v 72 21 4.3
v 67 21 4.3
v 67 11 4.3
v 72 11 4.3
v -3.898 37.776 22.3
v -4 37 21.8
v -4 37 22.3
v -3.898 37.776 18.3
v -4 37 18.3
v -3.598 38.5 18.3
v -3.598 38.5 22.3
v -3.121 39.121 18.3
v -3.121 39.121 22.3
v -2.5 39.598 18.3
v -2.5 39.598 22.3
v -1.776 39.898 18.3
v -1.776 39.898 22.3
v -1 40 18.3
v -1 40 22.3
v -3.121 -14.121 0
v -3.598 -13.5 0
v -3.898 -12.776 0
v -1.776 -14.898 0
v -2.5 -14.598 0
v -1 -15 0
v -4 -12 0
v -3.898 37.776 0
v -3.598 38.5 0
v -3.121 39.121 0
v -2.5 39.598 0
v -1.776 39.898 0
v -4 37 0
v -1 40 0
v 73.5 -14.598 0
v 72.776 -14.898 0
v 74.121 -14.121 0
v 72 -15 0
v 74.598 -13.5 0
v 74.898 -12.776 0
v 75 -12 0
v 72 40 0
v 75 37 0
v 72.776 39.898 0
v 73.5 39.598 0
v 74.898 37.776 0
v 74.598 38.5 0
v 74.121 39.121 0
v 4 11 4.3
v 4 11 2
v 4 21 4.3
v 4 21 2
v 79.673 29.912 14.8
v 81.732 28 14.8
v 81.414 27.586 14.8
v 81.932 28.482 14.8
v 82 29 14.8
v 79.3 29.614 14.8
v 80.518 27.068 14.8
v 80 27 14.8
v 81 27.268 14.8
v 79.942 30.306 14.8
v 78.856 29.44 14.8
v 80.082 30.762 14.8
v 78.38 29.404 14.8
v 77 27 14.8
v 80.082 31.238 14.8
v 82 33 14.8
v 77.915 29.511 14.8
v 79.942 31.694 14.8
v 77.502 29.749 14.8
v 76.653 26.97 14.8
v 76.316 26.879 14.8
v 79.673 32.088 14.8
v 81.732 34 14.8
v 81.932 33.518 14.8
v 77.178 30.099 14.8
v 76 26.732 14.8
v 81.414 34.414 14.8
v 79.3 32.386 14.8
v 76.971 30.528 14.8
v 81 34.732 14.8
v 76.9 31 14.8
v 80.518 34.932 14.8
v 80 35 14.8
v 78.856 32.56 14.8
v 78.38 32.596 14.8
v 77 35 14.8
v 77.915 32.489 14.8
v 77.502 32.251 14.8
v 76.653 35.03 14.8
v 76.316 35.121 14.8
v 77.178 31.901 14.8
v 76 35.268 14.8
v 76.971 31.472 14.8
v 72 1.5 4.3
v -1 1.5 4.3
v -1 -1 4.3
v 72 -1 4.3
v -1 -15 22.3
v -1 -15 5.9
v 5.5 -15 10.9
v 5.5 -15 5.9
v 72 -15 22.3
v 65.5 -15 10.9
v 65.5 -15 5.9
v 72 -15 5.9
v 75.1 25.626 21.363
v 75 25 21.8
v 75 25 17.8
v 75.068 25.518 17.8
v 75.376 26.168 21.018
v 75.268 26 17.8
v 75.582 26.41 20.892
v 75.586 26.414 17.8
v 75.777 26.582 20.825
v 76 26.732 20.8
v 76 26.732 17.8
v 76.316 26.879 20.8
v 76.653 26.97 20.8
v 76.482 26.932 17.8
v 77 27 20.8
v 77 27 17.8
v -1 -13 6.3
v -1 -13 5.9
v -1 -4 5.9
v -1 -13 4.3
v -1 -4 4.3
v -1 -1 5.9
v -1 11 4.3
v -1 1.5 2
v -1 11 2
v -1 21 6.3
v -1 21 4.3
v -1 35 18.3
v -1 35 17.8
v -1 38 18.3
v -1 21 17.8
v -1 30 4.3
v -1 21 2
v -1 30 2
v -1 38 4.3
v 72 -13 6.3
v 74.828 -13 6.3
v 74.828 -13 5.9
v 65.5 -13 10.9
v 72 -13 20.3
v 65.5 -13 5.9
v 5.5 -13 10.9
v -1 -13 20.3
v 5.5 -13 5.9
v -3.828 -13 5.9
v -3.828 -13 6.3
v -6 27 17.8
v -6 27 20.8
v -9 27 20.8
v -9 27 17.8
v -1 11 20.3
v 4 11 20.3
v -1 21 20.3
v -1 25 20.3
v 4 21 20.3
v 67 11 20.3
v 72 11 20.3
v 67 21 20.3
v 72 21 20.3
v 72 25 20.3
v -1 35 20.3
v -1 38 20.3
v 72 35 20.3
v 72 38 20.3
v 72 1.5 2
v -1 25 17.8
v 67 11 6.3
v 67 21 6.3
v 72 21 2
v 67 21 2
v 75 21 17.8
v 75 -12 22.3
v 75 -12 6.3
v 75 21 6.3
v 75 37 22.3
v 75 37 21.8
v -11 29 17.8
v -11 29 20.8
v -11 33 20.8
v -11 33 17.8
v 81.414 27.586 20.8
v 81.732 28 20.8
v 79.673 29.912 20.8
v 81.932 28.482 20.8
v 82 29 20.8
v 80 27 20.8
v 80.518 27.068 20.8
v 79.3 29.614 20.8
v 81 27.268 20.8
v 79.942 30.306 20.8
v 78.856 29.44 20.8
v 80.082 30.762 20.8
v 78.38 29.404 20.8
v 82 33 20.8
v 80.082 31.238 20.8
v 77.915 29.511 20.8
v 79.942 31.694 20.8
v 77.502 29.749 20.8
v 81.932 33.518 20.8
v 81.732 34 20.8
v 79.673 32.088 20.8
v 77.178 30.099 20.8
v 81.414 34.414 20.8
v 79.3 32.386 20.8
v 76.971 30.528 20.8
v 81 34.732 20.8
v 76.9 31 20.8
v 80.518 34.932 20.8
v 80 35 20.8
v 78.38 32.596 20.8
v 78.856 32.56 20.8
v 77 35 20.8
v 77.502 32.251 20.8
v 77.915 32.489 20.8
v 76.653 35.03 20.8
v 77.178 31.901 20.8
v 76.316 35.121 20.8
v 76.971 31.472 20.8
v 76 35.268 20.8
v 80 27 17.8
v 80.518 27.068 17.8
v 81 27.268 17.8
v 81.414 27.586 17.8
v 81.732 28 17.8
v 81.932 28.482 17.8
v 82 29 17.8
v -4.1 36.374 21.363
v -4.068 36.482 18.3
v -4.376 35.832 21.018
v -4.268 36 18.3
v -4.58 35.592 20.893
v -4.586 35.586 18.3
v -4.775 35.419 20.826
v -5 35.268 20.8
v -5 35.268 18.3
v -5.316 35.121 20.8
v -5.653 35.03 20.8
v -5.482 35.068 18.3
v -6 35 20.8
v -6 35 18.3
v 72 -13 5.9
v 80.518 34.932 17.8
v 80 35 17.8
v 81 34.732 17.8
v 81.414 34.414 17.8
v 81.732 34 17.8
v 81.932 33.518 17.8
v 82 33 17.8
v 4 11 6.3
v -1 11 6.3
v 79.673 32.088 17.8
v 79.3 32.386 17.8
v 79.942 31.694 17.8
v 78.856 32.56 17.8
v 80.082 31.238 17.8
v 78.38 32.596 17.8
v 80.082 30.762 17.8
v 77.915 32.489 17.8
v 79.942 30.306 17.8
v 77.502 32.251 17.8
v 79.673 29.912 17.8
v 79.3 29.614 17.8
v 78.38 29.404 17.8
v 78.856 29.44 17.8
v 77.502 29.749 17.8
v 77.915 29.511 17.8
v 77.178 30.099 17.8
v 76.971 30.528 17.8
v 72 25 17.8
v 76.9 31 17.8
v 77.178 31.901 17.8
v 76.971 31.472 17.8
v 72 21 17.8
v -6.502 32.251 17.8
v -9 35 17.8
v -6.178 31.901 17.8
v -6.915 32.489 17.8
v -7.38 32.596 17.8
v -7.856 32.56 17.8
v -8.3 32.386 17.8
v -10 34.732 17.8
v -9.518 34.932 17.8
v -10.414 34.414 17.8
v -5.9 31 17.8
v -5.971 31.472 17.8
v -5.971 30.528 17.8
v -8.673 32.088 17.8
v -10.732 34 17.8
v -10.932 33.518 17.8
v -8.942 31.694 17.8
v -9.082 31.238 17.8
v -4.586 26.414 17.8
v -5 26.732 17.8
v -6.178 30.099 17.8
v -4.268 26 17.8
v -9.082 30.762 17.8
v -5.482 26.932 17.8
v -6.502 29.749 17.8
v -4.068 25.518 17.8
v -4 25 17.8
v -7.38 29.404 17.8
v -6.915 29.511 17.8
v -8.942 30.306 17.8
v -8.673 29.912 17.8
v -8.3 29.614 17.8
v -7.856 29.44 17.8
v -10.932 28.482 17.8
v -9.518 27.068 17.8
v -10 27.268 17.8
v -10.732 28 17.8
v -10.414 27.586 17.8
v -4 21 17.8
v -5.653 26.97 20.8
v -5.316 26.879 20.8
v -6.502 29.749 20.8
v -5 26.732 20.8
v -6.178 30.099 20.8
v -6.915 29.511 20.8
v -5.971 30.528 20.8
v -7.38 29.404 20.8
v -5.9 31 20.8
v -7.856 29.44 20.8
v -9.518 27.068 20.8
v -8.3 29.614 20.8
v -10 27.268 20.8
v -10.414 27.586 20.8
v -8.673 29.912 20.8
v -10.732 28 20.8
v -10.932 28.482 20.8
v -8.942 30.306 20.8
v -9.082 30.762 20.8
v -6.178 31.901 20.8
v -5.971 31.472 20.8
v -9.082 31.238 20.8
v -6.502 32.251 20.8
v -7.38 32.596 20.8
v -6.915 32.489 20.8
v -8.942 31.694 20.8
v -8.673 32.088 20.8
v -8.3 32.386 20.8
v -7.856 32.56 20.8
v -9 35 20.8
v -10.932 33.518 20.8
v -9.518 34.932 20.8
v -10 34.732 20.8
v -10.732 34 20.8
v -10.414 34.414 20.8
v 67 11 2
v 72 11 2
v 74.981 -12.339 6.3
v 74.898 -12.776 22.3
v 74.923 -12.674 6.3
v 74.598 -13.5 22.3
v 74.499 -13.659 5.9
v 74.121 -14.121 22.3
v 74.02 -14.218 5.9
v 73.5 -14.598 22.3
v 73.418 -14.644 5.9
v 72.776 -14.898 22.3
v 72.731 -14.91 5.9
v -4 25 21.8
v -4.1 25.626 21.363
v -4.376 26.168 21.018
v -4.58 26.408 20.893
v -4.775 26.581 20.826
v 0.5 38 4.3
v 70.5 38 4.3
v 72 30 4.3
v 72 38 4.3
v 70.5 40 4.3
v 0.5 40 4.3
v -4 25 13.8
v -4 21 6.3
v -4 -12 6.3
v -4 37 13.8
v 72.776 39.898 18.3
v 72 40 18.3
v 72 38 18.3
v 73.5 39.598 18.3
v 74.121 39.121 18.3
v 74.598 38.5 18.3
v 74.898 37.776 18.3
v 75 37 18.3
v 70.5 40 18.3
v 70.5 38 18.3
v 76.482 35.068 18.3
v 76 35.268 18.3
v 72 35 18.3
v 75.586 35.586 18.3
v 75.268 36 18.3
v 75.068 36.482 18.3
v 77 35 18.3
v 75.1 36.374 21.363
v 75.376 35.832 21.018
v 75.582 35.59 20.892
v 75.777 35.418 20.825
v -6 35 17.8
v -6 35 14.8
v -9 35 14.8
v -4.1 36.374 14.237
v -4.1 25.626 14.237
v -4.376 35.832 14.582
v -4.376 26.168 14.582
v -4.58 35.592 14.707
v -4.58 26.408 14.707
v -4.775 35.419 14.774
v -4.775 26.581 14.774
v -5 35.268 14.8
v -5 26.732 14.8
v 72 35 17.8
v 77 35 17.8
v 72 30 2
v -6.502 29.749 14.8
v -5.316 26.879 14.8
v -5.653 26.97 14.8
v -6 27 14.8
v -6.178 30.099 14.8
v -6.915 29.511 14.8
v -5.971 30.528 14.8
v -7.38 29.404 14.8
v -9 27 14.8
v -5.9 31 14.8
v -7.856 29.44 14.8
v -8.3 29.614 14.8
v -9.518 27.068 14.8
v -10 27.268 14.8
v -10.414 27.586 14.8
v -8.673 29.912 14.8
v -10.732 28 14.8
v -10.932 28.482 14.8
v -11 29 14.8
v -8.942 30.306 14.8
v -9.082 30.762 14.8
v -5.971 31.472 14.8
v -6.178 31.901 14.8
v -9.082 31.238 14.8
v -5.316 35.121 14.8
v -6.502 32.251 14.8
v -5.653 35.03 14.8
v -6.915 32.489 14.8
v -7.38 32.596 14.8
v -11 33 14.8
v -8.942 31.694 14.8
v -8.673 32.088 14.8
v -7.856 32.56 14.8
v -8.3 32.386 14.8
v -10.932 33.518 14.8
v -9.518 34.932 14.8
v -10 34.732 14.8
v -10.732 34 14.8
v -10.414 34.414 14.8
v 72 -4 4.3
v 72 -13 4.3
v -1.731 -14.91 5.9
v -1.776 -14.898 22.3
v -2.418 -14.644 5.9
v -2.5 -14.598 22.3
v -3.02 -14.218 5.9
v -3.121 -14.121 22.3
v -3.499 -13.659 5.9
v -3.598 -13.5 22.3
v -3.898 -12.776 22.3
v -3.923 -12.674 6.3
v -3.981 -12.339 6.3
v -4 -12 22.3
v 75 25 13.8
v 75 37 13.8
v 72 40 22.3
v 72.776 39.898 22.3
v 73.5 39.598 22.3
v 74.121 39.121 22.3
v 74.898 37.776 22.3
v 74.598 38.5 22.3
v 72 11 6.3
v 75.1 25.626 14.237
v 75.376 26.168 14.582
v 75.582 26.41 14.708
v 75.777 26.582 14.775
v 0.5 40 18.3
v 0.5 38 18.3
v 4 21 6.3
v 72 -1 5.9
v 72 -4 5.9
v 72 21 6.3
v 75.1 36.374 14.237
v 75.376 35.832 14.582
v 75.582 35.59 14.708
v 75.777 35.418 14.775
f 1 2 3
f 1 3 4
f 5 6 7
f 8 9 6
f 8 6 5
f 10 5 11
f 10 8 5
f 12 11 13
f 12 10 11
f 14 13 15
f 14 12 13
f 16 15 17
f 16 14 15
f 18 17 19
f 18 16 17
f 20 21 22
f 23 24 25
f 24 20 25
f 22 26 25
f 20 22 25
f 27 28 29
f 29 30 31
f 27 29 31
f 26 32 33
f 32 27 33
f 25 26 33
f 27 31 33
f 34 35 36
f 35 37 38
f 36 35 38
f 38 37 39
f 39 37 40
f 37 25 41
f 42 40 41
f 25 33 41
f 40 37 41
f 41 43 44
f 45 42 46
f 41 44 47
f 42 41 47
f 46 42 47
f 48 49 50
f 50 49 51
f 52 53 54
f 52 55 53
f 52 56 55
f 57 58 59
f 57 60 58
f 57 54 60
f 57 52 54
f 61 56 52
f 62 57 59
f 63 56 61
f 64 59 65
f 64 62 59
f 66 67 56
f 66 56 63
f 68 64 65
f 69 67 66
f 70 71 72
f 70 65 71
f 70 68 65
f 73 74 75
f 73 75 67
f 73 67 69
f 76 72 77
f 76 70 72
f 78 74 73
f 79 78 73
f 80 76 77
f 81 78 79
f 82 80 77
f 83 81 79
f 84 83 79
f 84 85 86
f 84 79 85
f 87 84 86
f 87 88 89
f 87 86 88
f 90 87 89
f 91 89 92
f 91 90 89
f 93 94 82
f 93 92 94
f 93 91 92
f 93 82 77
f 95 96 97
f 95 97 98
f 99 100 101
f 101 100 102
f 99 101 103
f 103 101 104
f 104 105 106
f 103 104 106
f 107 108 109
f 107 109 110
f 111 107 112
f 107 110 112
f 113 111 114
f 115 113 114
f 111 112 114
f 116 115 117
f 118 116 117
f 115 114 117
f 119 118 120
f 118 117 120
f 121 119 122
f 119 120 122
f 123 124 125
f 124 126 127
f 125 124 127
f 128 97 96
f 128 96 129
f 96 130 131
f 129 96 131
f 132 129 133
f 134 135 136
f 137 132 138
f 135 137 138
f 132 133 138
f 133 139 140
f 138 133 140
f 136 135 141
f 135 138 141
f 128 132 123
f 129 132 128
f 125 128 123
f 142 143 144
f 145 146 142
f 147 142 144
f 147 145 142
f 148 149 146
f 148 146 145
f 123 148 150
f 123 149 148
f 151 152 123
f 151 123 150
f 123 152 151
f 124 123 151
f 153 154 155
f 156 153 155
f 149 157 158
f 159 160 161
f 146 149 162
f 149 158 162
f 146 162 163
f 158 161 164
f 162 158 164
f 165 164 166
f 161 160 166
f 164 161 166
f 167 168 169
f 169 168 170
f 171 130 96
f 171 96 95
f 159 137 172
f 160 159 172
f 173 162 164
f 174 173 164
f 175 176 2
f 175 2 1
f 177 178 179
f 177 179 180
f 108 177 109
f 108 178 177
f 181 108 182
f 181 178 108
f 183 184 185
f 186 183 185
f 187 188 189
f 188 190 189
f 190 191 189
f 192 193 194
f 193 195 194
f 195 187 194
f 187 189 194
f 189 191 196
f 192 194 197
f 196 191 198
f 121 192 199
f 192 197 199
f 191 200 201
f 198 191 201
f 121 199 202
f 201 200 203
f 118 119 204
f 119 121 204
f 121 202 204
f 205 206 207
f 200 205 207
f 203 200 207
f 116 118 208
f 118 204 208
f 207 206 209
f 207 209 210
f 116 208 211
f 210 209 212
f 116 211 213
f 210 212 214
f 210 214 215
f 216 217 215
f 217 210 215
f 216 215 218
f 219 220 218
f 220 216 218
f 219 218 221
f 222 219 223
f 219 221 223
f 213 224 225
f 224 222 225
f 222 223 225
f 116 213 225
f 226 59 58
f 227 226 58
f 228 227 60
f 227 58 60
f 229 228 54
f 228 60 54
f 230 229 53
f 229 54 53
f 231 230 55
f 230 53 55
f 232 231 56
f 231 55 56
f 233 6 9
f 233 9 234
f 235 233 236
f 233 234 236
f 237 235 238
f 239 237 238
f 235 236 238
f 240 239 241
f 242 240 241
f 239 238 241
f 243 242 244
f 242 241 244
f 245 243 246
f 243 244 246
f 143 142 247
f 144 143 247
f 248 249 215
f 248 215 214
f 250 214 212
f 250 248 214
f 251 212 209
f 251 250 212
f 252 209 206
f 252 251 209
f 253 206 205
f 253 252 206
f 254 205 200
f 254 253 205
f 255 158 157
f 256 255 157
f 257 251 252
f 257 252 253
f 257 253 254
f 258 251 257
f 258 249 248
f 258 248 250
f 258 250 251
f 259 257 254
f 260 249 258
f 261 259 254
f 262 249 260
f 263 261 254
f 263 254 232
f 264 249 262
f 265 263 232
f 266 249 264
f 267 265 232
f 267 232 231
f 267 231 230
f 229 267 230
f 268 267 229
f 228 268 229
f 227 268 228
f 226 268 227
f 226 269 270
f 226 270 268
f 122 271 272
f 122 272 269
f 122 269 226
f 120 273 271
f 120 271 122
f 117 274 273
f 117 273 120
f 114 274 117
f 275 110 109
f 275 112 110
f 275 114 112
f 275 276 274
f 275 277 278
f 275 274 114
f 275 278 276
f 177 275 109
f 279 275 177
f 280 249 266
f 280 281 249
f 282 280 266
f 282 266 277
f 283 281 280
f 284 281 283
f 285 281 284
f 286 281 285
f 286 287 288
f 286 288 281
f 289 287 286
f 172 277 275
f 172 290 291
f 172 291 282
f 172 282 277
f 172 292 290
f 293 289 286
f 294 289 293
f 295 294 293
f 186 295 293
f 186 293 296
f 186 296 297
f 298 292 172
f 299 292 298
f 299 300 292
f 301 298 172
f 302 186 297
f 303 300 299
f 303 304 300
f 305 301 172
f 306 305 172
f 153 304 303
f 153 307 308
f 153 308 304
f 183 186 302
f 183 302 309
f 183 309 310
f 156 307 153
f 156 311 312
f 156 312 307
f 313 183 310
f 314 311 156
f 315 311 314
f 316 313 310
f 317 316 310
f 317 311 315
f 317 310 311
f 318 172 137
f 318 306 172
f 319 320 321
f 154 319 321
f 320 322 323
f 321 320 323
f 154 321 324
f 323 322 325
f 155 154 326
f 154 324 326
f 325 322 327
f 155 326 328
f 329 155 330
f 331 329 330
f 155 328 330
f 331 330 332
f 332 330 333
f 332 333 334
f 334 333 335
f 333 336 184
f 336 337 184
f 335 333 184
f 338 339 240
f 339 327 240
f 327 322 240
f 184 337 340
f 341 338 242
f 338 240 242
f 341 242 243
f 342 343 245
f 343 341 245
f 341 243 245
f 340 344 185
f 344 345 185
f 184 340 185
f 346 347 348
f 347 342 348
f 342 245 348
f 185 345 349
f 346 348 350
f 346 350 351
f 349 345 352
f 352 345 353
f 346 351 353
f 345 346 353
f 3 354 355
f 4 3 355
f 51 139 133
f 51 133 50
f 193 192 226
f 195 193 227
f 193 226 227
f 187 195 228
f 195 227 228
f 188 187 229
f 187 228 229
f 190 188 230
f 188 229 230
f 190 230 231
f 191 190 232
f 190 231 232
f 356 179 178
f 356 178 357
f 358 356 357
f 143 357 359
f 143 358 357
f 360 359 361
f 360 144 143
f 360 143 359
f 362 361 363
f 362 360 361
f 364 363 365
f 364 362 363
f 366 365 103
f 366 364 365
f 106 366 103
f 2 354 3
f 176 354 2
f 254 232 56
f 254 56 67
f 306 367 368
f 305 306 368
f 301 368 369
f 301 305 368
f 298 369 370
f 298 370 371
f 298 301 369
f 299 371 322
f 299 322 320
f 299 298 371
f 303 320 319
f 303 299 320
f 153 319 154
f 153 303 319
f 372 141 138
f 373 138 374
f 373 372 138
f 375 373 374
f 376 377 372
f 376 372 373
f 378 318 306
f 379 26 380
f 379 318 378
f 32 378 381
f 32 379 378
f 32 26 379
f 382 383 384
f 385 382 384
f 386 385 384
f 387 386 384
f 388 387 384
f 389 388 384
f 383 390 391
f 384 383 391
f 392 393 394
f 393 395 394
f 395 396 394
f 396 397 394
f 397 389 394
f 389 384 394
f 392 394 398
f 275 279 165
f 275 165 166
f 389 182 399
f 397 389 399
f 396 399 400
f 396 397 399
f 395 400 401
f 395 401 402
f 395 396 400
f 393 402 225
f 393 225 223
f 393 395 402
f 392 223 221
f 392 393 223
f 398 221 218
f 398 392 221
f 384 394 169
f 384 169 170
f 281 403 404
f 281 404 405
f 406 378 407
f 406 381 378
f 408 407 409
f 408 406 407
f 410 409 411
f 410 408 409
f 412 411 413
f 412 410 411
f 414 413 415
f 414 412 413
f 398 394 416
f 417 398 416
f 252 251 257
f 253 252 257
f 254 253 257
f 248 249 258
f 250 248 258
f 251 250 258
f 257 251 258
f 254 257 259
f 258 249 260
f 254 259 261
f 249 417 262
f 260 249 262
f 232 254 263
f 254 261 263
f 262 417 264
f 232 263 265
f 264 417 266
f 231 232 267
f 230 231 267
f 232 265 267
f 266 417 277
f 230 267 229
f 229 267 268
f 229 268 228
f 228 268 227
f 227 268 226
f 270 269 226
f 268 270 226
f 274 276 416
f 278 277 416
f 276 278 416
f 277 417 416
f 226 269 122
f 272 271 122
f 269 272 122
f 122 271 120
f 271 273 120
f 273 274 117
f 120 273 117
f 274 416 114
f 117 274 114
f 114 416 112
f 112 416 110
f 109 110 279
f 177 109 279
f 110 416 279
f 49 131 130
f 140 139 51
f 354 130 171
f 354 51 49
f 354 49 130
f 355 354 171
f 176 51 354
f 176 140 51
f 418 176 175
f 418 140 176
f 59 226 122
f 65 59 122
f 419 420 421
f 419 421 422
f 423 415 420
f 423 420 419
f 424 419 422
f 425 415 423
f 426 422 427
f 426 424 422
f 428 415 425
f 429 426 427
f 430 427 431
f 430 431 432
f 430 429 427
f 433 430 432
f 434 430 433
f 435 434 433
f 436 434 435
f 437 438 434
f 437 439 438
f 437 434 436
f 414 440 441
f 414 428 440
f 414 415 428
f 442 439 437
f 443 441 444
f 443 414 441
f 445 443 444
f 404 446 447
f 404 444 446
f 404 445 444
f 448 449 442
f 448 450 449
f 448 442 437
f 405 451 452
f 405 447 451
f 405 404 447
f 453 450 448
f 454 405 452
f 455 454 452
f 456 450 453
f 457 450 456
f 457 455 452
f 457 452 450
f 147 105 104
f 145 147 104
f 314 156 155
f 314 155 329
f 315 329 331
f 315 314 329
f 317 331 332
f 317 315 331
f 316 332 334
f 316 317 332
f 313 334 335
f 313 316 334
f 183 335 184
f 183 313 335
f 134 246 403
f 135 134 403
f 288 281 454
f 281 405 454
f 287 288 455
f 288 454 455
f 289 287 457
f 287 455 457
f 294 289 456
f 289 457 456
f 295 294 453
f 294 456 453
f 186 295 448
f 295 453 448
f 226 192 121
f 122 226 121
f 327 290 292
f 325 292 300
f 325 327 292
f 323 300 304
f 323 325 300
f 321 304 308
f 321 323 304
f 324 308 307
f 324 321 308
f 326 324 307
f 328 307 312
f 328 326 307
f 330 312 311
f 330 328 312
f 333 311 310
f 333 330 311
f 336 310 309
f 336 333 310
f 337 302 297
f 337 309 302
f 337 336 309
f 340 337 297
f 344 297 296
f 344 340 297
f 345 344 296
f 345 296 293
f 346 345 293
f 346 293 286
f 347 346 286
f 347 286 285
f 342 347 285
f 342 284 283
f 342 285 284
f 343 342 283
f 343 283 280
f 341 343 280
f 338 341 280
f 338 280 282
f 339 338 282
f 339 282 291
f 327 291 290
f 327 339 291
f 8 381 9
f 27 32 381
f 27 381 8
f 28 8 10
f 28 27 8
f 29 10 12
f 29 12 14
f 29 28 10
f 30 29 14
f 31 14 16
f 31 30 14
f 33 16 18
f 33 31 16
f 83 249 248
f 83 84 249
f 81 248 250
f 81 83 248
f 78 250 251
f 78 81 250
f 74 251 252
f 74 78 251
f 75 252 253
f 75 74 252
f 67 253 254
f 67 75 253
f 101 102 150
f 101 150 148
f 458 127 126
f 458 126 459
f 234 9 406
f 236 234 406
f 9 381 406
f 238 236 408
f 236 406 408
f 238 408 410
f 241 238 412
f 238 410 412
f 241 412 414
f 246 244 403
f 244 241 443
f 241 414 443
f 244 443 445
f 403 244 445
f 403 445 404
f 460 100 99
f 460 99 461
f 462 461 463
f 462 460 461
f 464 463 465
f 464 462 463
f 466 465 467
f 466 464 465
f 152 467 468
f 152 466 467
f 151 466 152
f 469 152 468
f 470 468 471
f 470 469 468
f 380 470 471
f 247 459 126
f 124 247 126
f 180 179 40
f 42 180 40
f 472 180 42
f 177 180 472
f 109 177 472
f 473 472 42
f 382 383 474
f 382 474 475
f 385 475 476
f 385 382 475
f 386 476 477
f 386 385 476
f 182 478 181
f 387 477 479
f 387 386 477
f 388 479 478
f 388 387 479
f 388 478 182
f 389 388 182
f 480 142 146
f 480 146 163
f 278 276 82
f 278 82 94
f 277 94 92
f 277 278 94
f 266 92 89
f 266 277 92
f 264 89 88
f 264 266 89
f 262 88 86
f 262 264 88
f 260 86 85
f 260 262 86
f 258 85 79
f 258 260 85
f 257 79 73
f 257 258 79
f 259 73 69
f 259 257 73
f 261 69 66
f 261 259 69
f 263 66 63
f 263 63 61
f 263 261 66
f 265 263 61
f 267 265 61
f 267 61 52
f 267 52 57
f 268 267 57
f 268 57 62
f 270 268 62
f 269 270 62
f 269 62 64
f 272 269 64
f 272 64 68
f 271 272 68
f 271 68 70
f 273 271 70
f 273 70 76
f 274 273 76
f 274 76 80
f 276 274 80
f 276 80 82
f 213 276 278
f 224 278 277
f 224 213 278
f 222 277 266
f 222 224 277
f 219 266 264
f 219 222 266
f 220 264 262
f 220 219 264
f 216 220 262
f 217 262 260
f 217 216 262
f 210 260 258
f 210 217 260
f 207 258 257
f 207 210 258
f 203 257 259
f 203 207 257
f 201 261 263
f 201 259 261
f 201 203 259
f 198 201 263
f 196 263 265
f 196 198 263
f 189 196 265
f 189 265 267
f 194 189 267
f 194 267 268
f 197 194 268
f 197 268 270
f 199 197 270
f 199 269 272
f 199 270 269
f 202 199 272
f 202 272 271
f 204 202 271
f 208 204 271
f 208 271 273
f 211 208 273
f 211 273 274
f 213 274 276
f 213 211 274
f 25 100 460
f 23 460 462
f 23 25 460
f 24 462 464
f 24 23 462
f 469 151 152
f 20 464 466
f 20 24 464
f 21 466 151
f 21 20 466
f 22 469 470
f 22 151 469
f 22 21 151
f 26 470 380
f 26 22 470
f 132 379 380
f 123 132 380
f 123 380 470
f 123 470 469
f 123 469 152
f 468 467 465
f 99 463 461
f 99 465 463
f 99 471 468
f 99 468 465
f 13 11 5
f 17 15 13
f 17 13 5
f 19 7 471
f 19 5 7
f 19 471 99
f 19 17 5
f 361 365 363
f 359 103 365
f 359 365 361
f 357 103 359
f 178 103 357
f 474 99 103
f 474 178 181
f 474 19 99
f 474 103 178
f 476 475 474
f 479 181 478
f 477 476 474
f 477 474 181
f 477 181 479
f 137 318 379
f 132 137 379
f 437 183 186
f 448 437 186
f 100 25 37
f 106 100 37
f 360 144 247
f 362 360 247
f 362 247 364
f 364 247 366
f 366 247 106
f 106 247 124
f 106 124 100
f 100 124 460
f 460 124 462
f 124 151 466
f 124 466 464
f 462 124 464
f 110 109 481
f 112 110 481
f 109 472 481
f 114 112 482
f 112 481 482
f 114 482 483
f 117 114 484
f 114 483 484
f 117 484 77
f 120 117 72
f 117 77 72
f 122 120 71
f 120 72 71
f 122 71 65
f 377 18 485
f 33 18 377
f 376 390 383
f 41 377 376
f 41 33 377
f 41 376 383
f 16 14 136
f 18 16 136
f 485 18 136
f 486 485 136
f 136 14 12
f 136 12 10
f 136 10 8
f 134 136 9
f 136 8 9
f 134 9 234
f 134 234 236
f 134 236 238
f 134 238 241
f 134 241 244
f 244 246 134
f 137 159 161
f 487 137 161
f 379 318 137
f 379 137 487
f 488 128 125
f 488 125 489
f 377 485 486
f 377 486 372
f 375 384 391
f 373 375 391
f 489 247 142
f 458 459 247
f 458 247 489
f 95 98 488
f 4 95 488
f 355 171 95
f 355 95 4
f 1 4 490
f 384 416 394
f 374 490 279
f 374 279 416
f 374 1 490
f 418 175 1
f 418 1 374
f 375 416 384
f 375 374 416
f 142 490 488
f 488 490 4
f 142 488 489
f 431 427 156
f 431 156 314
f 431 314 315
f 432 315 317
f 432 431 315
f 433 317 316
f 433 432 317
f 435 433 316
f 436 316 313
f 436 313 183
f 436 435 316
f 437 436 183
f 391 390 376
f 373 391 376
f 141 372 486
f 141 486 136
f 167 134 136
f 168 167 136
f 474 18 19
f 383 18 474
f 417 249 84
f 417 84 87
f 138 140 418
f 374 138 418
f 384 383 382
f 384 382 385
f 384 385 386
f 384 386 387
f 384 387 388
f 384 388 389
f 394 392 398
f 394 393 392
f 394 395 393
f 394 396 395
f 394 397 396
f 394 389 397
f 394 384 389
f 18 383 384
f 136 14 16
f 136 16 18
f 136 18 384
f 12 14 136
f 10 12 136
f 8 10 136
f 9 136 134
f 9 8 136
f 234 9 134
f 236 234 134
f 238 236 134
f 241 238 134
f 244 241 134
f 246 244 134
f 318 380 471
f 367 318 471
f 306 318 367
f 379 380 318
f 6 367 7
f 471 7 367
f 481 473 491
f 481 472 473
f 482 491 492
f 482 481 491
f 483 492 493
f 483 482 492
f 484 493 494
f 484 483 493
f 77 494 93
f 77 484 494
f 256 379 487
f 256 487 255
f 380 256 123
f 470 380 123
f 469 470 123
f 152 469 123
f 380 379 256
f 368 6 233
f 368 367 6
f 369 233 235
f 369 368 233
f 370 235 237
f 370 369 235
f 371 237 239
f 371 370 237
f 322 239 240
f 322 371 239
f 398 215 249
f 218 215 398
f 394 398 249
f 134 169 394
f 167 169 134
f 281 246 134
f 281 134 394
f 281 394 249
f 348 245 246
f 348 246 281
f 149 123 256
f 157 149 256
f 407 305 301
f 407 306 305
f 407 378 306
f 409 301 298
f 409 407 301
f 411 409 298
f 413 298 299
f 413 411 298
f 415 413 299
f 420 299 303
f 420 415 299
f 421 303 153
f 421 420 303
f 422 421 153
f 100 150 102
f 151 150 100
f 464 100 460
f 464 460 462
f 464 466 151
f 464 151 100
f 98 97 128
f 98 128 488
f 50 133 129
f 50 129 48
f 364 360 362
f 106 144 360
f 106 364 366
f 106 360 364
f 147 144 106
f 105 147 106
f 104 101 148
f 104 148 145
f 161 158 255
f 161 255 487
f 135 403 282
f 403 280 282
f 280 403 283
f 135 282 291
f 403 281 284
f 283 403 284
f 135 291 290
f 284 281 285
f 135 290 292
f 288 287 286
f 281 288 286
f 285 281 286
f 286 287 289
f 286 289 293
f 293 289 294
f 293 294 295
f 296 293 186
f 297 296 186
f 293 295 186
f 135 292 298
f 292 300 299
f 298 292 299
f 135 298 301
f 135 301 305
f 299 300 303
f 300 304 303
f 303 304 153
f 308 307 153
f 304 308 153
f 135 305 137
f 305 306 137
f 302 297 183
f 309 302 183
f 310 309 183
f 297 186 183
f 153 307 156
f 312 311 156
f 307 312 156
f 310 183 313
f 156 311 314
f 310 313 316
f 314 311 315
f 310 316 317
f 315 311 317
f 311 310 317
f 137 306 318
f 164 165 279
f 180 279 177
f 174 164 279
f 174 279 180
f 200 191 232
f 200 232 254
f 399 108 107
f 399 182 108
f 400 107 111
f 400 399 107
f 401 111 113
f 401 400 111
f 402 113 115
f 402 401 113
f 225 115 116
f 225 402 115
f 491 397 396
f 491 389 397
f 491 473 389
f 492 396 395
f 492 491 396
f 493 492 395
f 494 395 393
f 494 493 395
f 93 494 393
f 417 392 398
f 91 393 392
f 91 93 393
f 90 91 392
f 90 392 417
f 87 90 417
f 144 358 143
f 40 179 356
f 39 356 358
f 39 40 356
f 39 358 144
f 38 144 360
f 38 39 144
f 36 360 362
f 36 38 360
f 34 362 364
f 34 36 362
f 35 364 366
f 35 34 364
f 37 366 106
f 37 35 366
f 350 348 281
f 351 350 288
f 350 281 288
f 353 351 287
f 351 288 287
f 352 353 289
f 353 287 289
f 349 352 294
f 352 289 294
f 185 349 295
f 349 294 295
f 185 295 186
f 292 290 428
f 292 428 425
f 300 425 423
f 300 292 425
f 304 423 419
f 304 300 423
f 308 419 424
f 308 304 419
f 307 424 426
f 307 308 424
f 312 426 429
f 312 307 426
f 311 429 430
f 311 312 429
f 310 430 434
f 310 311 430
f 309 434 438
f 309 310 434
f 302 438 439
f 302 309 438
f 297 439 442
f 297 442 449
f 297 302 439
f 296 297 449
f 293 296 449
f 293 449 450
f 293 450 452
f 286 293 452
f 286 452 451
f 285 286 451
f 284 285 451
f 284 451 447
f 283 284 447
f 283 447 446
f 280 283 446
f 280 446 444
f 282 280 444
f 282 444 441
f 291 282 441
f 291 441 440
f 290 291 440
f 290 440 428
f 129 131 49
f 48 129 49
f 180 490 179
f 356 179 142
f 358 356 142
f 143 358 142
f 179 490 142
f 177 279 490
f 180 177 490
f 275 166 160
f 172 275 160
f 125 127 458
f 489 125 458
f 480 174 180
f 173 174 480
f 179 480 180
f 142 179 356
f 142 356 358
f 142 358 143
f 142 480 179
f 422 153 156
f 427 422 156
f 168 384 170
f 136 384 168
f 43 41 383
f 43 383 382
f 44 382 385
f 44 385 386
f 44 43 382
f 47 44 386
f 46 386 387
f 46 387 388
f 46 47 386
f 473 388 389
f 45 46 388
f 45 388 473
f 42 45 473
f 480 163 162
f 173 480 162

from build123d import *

# Parameters (mm, degrees)
SKETCH1_W                = 79
SKETCH1_H                = 55
BOSS_EXTRUDE1_DEPTH      = 2
SKETCH2_W                = 79
SKETCH2_H                = 10
SKETCH2_W_2              = 8
SKETCH2_H_2              = 16.5
BOSS_EXTRUDE2_DEPTH      = 2.3
SKETCH3_W                = 79
SKETCH3_H                = 55
SKETCH3_W_2              = 73
SKETCH3_H_2              = 51
BOSS_EXTRUDE3_DEPTH      = 20.3
SKETCH12_W               = 73
SKETCH12_H               = 3
BOSS_EXTRUDE8_DEPTH      = 1.6
SKETCH4_W                = 70
SKETCH4_H                = 14
CUT_EXTRUDE1_DEPTH       = 16
SKETCH5_W                = 60
SKETCH5_H                = 5
CUT_EXTRUDE2_DEPTH       = 16
SKETCH6_W                = 79
SKETCH6_H                = 55
BOSS_EXTRUDE4_DEPTH      = 2
SKETCH7_W                = 73
SKETCH7_H                = 10
BOSS_EXTRUDE5_DEPTH      = 2.5
SKETCH8_W                = 8
SKETCH8_H                = 10
BOSS_EXTRUDE6_DEPTH      = 14
BOSS_EXTRUDE7_DEPTH      = 3
BOSS_EXTRUDE7_DEPTH_BACK = 3
SKETCH10_W               = 7
SKETCH10_H               = 8
SKETCH10_R               = 1.6
FILLET1_R                = 2
FILLET2_R                = 1
FILLET3_START            = -1
FILLET3_DEPTH            = 24
SURFACE_EXTRUDE1_1_BACK  = 90
SURFACE_EXTRUDE1_1_DEPTH = 100
SURFACE_EXTRUDE1_2_BACK  = 90
SURFACE_EXTRUDE1_2_DEPTH = 100


with BuildPart() as part:
    # Sketch1 → Boss-Extrude1 (new body)
    with BuildSketch(Plane.XY):
        with Locations((35.5, 12.5)):
            Rectangle(SKETCH1_W, SKETCH1_H)
    extrude(amount=BOSS_EXTRUDE1_DEPTH)

    # Sketch2 → Boss-Extrude2 (add)
    with BuildSketch(Plane.XY.offset(2)):
        with Locations((35.5, 35)):
            Rectangle(SKETCH2_W, SKETCH2_H)
        with Locations((0, 16)):
            Rectangle(SKETCH2_W_2, SKETCH2_H)
        with Locations((71, 16)):
            Rectangle(SKETCH2_W_2, SKETCH2_H)
        with Locations((35.5, -6.75)):
            Rectangle(SKETCH2_W, SKETCH2_H_2)
    extrude(amount=BOSS_EXTRUDE2_DEPTH)

    # Sketch3 → Boss-Extrude3 (add)
    with BuildSketch(Plane(origin=(0, 0, 0), x_dir=(-1, 0, 0), z_dir=(0, 0, -1))):
        with Locations((-35.5, 12.5)):
            Rectangle(SKETCH3_W, SKETCH3_H)
        with Locations((-35.5, 12.5)):
            Rectangle(SKETCH3_W_2, SKETCH3_H_2, mode=Mode.SUBTRACT)
    extrude(amount=-BOSS_EXTRUDE3_DEPTH)

    # Sketch12 → Boss-Extrude8 (add)
    with BuildSketch(Plane.XY.offset(4.3)):
        with Locations((35.5, -2.5)):
            Rectangle(SKETCH12_W, SKETCH12_H)
    extrude(amount=BOSS_EXTRUDE8_DEPTH)

    # Sketch4 → Cut-Extrude1 (cut)
    with BuildSketch(Plane(origin=(0, 40, 0), x_dir=(1, 0, 0), z_dir=(0, 1, 0))):
        with Locations((35.5, -11.3)):
            Rectangle(SKETCH4_W, SKETCH4_H)
    extrude(amount=-CUT_EXTRUDE1_DEPTH, mode=Mode.SUBTRACT)

    # Sketch5 → Cut-Extrude2 (cut)
    with BuildSketch(Plane.XZ.offset(15)):
        with Locations((35.5, 8.4)):
            Rectangle(SKETCH5_W, SKETCH5_H)
    extrude(amount=-CUT_EXTRUDE2_DEPTH, mode=Mode.SUBTRACT)

    # Sketch6 → Boss-Extrude4 (add)
    with BuildSketch(Plane.XY.offset(20.3)):
        with Locations((35.5, 12.5)):
            Rectangle(SKETCH6_W, SKETCH6_H)
    extrude(amount=BOSS_EXTRUDE4_DEPTH)

    # Sketch7 → Boss-Extrude5 (add)
    with BuildSketch(Plane(origin=(0, 0, 20.3), x_dir=(-1, 0, 0), z_dir=(0, 0, -1))):
        with Locations((-35.5, 30)):
            Rectangle(SKETCH7_W, SKETCH7_H)
    extrude(amount=BOSS_EXTRUDE5_DEPTH)

    # Sketch8 → Boss-Extrude6 (add)
    with BuildSketch(Plane(origin=(0, 0, 20.3), x_dir=(-1, 0, 0), z_dir=(0, 0, -1))):
        with Locations((-71, 16)):
            Rectangle(SKETCH8_W, SKETCH8_H)
        with Locations((0, 16)):
            Rectangle(SKETCH8_W, SKETCH8_H)
    extrude(amount=BOSS_EXTRUDE6_DEPTH)

    # Sketch10 → Boss-Extrude7 (add, two sides: drawn at the far end of the back side and taken through both)
    # profile 1 of 2: a face of its own
    with BuildSketch(Plane(origin=(0, 0, 17.8), x_dir=(-1, 0, 0), z_dir=(0, 0, -1)).offset(-BOSS_EXTRUDE7_DEPTH_BACK)):
        with Locations((-78.5, 31)):
            Rectangle(SKETCH10_W, SKETCH10_H)
        with Locations((-78.5, 31)):
            Circle(SKETCH10_R, mode=Mode.SUBTRACT)
    # profile 2 of 2: a face of its own
    with BuildSketch(Plane(origin=(0, 0, 17.8), x_dir=(-1, 0, 0), z_dir=(0, 0, -1)).offset(-BOSS_EXTRUDE7_DEPTH_BACK)):
        with Locations((7.5, 31)):
            Rectangle(SKETCH10_W, SKETCH10_H)
        with Locations(Location((7.5, 31, 0), (0, 0, 180))):
            Circle(SKETCH10_R, mode=Mode.SUBTRACT)
    extrude(amount=BOSS_EXTRUDE7_DEPTH + BOSS_EXTRUDE7_DEPTH_BACK)

    # Fillet1
    fillet1_edges = [part.edges().sort_by_distance(p)[0] for p in [
        (75, 35, 17.8),
        (75, 27, 17.8),
        (82, 27, 17.8),
        (82, 35, 17.8),
        (-4, 35, 17.8),
        (-11, 35, 17.8),
        (-11, 27, 17.8),
        (-4, 27, 17.8),
    ]]
    fillet(fillet1_edges, radius=FILLET1_R)

    # Fillet2
    fillet2_edges = [part.edges().sort_by_distance(p)[0] for p in [
        (75, 31, 20.8),
        (75, 31, 14.8),
        (-4, 31, 20.8),
        (-4, 31, 14.8),
    ]]
    fillet(fillet2_edges, radius=FILLET2_R)

    # Fillet3: read off the stored shape, not the designer's step
    # Fillet3 outline → Fillet3 (cut)
    with BuildSketch(Plane.XY.offset(FILLET3_START)):
        with BuildLine():
            Line((75, 40), (72, 40))
            ThreePointArc((72, 40), (74.121320344, 39.121320344), (75, 37))
            Line((75, 37), (75, 40))
        make_face()
        with BuildLine():
            ThreePointArc((-4, 37), (-3.121320344, 39.121320344), (-1, 40))
            Line((-1, 40), (-4, 40))
            Line((-4, 40), (-4, 37))
        make_face()
        with BuildLine():
            Line((75, -15), (75, -12))
            ThreePointArc((75, -12), (74.121320344, -14.121320344), (72, -15))
            Line((72, -15), (75, -15))
        make_face()
        with BuildLine():
            ThreePointArc((-1, -15), (-3.121320344, -14.121320344), (-4, -12))
            Line((-4, -12), (-4, -15))
            Line((-4, -15), (-1, -15))
        make_face()
    extrude(amount=FILLET3_DEPTH, mode=Mode.SUBTRACT)


with BuildPart() as body_2:
    # Split1: the piece behind the surface
    add(part.part)
    # Surface-Extrude1: a surface, the sketch's curves swept straight by 100 mm
    with BuildLine(Plane(origin=(75, 0, 0), x_dir=(0, 0, -1), z_dir=(1, 0, 0)).offset(-SURFACE_EXTRUDE1_1_BACK), mode=Mode.PRIVATE) as surface_extrude1_1_path:
        Line((-18.3, 43.152983042), (-18.3, 35))
        Line((-18.3, 35), (-17.8, 35))
        Line((-17.8, 35), (-17.8, 21))
        Line((-17.8, 21), (-6.3, 21))
        Line((-6.3, 21), (-6.3, 11))
        Line((-6.3, 11), (-6.3, -13))
        Line((-6.3, -13), (-5.9, -13))
        Line((-5.9, -13), (-5.9, -15))
        Line((-5.9, -15), (-5.9, -17.138278701))
    surface_extrude1_1 = Shell.extrude(surface_extrude1_1_path.wire(), (1 * SURFACE_EXTRUDE1_1_DEPTH, 0 * SURFACE_EXTRUDE1_1_DEPTH, 0 * SURFACE_EXTRUDE1_1_DEPTH))
    split(bisect_by=surface_extrude1_1, keep=Keep.BOTTOM)


with BuildPart() as part_1:
    add(part.part)

    # Split1: split by a surface, the side it looks to stays
    # Surface-Extrude1: a surface, the sketch's curves swept straight by 100 mm
    with BuildLine(Plane(origin=(75, 0, 0), x_dir=(0, 0, -1), z_dir=(1, 0, 0)).offset(-SURFACE_EXTRUDE1_2_BACK), mode=Mode.PRIVATE) as surface_extrude1_2_path:
        Line((-18.3, 43.152983042), (-18.3, 35))
        Line((-18.3, 35), (-17.8, 35))
        Line((-17.8, 35), (-17.8, 21))
        Line((-17.8, 21), (-6.3, 21))
        Line((-6.3, 21), (-6.3, 11))
        Line((-6.3, 11), (-6.3, -13))
        Line((-6.3, -13), (-5.9, -13))
        Line((-5.9, -13), (-5.9, -15))
        Line((-5.9, -15), (-5.9, -17.138278701))
    surface_extrude1_2 = Shell.extrude(surface_extrude1_2_path.wire(), (1 * SURFACE_EXTRUDE1_2_DEPTH, 0 * SURFACE_EXTRUDE1_2_DEPTH, 0 * SURFACE_EXTRUDE1_2_DEPTH))
    split(bisect_by=surface_extrude1_2, keep=Keep.TOP)


solid = Compound([body_2.part, part_1.part])
